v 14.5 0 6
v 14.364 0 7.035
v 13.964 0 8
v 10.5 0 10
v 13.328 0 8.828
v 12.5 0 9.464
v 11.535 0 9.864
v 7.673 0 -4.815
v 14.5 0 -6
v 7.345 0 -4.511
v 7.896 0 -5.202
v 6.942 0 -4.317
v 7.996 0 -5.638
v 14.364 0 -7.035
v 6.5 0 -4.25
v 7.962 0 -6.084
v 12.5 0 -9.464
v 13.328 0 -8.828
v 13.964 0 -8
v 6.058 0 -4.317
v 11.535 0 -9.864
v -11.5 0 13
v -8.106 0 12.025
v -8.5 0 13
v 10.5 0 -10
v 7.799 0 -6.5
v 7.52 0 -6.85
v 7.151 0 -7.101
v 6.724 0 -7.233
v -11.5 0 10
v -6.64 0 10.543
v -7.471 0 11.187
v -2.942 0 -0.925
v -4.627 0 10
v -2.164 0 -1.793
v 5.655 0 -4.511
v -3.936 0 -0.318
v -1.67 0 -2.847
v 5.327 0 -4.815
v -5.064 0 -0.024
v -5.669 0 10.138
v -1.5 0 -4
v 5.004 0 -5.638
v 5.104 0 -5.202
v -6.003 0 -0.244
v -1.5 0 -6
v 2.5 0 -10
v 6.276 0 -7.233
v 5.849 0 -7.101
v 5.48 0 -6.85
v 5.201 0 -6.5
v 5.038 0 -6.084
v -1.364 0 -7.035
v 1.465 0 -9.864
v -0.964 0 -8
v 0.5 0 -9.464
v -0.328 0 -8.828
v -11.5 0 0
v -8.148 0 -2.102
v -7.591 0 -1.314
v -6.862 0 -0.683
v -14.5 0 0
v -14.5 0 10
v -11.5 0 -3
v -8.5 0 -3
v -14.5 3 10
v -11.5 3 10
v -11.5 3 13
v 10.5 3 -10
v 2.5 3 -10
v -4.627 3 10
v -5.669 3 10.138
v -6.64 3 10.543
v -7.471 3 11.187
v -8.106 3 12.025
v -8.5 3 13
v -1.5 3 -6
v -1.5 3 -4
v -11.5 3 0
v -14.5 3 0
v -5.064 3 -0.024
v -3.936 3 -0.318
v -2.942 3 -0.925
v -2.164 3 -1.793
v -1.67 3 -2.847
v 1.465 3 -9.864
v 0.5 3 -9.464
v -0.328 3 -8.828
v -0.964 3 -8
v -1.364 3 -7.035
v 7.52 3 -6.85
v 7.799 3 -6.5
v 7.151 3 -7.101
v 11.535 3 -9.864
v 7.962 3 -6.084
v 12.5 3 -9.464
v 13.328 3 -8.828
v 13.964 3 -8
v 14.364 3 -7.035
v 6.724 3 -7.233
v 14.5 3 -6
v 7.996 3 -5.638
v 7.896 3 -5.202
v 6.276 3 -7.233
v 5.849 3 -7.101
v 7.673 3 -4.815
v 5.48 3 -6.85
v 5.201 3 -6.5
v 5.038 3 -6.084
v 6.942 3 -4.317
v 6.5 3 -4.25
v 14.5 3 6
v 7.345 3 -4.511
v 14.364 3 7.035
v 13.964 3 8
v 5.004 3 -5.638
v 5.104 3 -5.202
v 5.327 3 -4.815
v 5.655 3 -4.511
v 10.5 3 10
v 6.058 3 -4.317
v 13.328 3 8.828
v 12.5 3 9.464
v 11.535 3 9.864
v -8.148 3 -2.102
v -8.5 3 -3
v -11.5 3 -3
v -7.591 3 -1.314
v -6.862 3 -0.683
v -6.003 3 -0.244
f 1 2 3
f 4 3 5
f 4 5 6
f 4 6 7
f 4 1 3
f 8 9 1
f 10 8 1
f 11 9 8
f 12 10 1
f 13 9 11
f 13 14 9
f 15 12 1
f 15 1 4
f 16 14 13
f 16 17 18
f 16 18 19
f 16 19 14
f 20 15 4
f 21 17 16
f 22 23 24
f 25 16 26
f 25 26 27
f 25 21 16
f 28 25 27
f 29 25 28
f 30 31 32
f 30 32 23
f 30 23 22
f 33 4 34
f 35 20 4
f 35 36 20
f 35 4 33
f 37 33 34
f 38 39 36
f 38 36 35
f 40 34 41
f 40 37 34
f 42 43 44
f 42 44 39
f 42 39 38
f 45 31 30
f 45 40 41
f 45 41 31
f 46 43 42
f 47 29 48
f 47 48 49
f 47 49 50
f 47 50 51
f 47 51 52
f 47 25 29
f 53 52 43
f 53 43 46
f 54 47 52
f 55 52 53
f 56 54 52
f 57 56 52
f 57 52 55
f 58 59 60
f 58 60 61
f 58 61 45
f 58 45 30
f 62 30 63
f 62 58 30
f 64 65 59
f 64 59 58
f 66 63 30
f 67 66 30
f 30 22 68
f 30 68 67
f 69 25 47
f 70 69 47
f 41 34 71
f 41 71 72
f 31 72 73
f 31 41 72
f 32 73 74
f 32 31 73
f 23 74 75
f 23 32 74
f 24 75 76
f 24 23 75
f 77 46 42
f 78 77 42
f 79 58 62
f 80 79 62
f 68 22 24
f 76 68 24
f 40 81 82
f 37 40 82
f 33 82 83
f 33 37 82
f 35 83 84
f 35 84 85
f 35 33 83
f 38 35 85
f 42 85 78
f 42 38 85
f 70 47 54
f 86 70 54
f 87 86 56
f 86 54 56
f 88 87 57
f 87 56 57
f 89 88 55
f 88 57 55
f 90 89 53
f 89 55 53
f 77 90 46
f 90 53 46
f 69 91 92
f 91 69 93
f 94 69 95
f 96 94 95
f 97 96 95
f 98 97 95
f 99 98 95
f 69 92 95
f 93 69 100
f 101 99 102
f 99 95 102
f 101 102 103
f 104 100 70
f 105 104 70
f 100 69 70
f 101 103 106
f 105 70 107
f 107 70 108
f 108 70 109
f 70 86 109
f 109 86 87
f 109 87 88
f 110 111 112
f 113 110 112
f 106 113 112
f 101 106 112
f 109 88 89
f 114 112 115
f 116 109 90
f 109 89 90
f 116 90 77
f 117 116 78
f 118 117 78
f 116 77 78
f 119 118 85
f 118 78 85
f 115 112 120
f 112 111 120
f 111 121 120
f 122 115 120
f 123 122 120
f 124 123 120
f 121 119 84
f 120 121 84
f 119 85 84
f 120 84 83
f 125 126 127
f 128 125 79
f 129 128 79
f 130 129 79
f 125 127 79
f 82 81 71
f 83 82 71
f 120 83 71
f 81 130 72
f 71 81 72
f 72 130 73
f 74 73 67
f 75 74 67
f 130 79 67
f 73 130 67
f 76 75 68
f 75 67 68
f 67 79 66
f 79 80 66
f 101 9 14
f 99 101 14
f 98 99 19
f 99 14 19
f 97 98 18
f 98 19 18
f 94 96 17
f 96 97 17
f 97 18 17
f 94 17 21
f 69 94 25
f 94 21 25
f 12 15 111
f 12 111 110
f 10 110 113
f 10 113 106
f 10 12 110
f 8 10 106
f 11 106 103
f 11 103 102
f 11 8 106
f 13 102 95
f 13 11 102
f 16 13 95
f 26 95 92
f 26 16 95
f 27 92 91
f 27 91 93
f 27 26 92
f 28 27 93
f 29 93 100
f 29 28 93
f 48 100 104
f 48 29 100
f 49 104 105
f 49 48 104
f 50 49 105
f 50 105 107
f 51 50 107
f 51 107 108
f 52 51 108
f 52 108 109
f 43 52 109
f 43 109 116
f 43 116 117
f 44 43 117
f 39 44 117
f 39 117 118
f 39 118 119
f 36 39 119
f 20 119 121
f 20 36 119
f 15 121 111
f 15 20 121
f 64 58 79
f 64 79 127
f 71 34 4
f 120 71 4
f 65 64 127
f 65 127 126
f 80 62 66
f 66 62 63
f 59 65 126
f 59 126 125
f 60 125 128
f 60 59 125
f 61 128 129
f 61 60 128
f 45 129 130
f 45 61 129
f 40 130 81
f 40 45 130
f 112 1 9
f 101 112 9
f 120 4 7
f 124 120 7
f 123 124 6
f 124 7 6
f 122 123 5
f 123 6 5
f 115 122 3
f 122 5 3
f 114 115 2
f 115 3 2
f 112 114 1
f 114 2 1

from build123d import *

# Parameters (mm, degrees)
SKETCH1_R           = 1.5
SKETCH1_W           = 3
SKETCH1_H           = 3
BOSS_EXTRUDE1_DEPTH = 3
FILLET1_R           = 4


with BuildPart() as part:
    # Sketch1 → Boss-Extrude1 (new body)
    # profile 1 of 3: a face of its own
    with BuildSketch(Plane(origin=(0, 0, 0), x_dir=(1, 0, 0), z_dir=(0, 1, 0))):
        Polygon((14.5, 10), (-1.5, 10), (-1.5, 0), (-8.5, 0), (-11.5, 0), (-14.5, 0), (-14.5, -10), (-11.5, -10), (-8.5, -10), (14.5, -10), align=None)
        with Locations(Location((6.5, 5.75, 0), (0, 0, 270))):
            Circle(SKETCH1_R, mode=Mode.SUBTRACT)
    # profile 2 of 3: a face of its own
    with BuildSketch(Plane(origin=(0, 0, 0), x_dir=(1, 0, 0), z_dir=(0, 1, 0))):
        with Locations((-10, -11.5)):
            Rectangle(SKETCH1_W, SKETCH1_H)
    # profile 3 of 3: a face of its own
    with BuildSketch(Plane(origin=(0, 0, 0), x_dir=(1, 0, 0), z_dir=(0, 1, 0))):
        with Locations((-10, 1.5)):
            Rectangle(SKETCH1_W, SKETCH1_H)
    extrude(amount=BOSS_EXTRUDE1_DEPTH)

    # Fillet1
    # the kernel refuses this fillet: 4 mm, written as the material it adds along each edge
    with BuildSketch(Plane(origin=(-8.5, 0, 0), x_dir=(1, 0, 0), z_dir=(0, 1, 0))) as fillet1_piece_1:
        with BuildLine():
            CenterArc((3.872983346, 4), FILLET1_R, 194.477512186, 75.522487814)
            Line((0, 3), (0, 0))
            Line((0, 0), (3.872983346, 0))
        make_face()
    extrude(amount=3)
    with BuildSketch(Plane(origin=(-8.5, 0, 10), x_dir=(1, 0, 0), z_dir=(0, 1, 0))) as fillet1_piece_2:
        with BuildLine():
            CenterArc((3.872983346, -4), FILLET1_R, 90, 75.522487814)
            Line((0, -3), (0, 0))
            Line((0, 0), (3.872983346, 0))
        make_face()
    extrude(amount=3)
    with BuildSketch(Plane(origin=(-1.5, 0, 0), x_dir=(0, 0, -1), z_dir=(0, 1, 0))) as fillet1_piece_3:
        with BuildLine():
            CenterArc((FILLET1_R, FILLET1_R), FILLET1_R, 180, 90)
            Line((0, FILLET1_R), (0, 0))
            Line((0, 0), (FILLET1_R, 0))
        make_face()
    extrude(amount=3)
    # the kernel refuses this fillet: 4 mm, written as the material it takes off along each edge
    with BuildSketch(Plane(origin=(14.5, -10, 10), x_dir=(0, 0, -1), z_dir=(0, 1, 0)), Plane(origin=(14.5, -10, -10), x_dir=(-1, 0, 0), z_dir=(0, 1, 0))) as fillet1_2_piece_1:
        with BuildLine():
            CenterArc((FILLET1_R, FILLET1_R), FILLET1_R, 180, 90)
            Line((0, FILLET1_R), (0, 0))
            Line((0, 0), (FILLET1_R, 0))
        make_face()
    extrude(amount=23, mode=Mode.SUBTRACT)
    with BuildSketch(Plane(origin=(-1.5, -10, -10), x_dir=(1, 0, 0), z_dir=(0, 1, 0))) as fillet1_2_piece_2:
        with BuildLine():
            CenterArc((FILLET1_R, -FILLET1_R), FILLET1_R, 90, 90)
            Line((0, -FILLET1_R), (0, 0))
            Line((0, 0), (FILLET1_R, 0))
        make_face()
    extrude(amount=23, mode=Mode.SUBTRACT)


solid = part.part
